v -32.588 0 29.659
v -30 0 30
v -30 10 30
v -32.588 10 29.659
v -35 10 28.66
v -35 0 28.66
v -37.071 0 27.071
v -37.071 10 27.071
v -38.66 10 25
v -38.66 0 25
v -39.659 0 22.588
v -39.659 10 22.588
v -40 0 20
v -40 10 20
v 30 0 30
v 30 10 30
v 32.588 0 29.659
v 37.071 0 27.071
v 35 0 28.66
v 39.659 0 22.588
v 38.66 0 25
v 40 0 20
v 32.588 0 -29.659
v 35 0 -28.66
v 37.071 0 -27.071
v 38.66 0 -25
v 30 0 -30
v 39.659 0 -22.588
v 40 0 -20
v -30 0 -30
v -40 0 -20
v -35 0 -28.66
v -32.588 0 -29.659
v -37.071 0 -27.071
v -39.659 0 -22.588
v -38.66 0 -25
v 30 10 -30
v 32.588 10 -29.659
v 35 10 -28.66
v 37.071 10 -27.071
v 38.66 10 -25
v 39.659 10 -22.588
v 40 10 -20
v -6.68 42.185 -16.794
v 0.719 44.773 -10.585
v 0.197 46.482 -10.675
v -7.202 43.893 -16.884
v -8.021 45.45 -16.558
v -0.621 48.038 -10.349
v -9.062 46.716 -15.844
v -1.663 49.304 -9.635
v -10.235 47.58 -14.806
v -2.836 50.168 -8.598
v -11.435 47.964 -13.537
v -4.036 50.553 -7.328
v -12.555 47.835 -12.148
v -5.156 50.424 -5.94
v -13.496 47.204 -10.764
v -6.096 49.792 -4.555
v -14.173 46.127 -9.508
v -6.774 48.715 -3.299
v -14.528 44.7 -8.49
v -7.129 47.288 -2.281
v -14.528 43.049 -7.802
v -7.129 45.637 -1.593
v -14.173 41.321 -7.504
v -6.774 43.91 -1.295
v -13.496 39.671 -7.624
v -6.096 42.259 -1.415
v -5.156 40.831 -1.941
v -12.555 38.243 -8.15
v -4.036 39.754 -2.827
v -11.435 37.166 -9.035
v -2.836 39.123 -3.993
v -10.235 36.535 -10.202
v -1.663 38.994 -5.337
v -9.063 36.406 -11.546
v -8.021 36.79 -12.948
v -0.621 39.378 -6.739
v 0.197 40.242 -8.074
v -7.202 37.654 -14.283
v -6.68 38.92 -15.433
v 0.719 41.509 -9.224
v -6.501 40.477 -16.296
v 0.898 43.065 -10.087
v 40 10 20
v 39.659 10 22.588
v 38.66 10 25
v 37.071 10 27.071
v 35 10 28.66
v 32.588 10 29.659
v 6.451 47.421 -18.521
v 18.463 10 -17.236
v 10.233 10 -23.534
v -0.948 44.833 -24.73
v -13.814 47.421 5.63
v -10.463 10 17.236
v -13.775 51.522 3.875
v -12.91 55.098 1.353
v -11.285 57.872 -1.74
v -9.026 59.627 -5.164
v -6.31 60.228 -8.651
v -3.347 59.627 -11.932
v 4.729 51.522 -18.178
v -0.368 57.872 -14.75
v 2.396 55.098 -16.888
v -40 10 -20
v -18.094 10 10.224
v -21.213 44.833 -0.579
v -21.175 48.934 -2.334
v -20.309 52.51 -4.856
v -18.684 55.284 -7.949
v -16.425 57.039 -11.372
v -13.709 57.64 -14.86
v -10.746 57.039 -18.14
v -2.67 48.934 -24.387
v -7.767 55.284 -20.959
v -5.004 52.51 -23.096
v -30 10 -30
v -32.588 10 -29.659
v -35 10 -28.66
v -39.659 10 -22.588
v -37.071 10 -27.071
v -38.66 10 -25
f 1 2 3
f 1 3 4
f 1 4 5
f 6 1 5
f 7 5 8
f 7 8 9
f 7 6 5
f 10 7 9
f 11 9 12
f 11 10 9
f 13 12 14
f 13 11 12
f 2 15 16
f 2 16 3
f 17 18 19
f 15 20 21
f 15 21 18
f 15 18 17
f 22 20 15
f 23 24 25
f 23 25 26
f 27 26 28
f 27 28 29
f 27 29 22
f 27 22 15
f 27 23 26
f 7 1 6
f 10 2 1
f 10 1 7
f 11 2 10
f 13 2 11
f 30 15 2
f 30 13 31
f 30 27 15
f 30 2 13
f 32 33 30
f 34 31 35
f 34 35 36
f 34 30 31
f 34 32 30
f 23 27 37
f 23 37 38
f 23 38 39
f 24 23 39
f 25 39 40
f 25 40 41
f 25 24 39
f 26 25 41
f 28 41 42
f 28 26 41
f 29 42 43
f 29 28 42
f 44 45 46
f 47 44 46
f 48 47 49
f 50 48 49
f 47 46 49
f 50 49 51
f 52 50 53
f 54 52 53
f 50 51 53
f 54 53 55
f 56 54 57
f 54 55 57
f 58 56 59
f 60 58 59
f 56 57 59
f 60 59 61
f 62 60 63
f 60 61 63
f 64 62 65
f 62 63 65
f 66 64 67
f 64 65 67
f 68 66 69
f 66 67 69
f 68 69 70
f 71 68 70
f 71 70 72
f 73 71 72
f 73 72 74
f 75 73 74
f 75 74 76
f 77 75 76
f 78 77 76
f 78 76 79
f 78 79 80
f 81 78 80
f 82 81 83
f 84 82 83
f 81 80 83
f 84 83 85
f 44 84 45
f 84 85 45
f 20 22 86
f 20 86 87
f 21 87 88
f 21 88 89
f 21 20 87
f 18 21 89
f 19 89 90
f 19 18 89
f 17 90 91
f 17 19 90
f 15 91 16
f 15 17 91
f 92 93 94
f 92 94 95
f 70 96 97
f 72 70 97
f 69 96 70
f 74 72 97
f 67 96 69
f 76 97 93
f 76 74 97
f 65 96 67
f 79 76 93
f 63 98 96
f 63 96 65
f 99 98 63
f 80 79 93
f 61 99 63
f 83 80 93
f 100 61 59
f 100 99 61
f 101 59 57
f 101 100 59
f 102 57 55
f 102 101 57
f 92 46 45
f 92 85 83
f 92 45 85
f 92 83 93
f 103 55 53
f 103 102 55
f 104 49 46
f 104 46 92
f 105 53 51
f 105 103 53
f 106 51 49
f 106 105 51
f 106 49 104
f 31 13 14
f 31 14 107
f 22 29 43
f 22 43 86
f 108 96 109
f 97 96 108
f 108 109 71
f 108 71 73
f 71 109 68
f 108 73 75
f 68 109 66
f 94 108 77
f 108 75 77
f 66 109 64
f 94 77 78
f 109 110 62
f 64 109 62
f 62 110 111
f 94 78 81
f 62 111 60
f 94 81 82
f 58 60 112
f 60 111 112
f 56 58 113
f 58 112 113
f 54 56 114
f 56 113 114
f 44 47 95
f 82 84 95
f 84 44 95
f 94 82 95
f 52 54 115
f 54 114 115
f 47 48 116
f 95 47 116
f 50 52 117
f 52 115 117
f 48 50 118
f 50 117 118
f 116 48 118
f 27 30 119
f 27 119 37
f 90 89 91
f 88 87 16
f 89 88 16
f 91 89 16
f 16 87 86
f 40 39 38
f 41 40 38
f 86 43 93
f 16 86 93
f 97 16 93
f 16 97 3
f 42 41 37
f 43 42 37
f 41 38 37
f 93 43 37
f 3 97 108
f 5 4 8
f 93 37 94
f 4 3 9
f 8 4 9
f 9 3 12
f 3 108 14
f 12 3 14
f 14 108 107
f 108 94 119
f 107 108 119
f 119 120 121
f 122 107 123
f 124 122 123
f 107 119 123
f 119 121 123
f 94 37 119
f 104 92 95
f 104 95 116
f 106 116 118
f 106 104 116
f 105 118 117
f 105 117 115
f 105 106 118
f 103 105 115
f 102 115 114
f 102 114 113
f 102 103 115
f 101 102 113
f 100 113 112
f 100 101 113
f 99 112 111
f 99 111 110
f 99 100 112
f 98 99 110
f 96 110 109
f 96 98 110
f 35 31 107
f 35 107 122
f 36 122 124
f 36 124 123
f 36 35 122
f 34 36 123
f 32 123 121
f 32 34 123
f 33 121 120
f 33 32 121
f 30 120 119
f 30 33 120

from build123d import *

# Parameters (mm, degrees)
EXTRUDE_1_DEPTH = 10
SKETCH_5_R      = 6
EXTRUDE_2_DEPTH = 10


with BuildPart() as part:
    # 草图1 → 凸台-拉伸1 (new body)
    with BuildSketch(Plane(origin=(0, 0, 0), x_dir=(1, 0, 0), z_dir=(0, 1, 0))):
        with BuildLine():
            Line((-30, 30), (30, 30))
            ThreePointArc((30, 30), (37.071067812, 27.071067812), (40, 20))
            Line((40, 20), (40, -20))
            ThreePointArc((40, -20), (37.071067812, -27.071067812), (30, -30))
            Line((30, -30), (-30, -30))
            ThreePointArc((-30, -30), (-37.071067812, -27.071067812), (-40, -20))
            Line((-40, -20), (-40, 20))
            ThreePointArc((-40, 20), (-37.071067812, 27.071067812), (-30, 30))
        make_face()
    extrude(amount=EXTRUDE_1_DEPTH)

    # 草图5 → 凸台-拉伸2 (add)
    with BuildSketch(Plane(origin=(4.105168422, 1.435917424, 3.444645309), x_dir=(0.6427876096865377, 0, -0.7660444431189795), z_dir=(0.73994211169385, 0.2588190451025179, 0.6208851530148445))):
        with BuildLine():
            Line((-19.928849561, 8.866190698), (25.071150439, 8.866190698))
            Line((25.071150439, 8.866190698), (18.334609469, 47.607241481))
            ThreePointArc((18.334609469, 47.607241481), (2.571150439, 60.866190698), (-13.192308592, 47.607241481))
            Line((-13.192308592, 47.607241481), (-19.928849561, 8.866190698))
        make_face()
        with Locations((2.571150439, 44.866190698)):
            Circle(SKETCH_5_R, mode=Mode.SUBTRACT)
    extrude(amount=-EXTRUDE_2_DEPTH)


solid = part.part
